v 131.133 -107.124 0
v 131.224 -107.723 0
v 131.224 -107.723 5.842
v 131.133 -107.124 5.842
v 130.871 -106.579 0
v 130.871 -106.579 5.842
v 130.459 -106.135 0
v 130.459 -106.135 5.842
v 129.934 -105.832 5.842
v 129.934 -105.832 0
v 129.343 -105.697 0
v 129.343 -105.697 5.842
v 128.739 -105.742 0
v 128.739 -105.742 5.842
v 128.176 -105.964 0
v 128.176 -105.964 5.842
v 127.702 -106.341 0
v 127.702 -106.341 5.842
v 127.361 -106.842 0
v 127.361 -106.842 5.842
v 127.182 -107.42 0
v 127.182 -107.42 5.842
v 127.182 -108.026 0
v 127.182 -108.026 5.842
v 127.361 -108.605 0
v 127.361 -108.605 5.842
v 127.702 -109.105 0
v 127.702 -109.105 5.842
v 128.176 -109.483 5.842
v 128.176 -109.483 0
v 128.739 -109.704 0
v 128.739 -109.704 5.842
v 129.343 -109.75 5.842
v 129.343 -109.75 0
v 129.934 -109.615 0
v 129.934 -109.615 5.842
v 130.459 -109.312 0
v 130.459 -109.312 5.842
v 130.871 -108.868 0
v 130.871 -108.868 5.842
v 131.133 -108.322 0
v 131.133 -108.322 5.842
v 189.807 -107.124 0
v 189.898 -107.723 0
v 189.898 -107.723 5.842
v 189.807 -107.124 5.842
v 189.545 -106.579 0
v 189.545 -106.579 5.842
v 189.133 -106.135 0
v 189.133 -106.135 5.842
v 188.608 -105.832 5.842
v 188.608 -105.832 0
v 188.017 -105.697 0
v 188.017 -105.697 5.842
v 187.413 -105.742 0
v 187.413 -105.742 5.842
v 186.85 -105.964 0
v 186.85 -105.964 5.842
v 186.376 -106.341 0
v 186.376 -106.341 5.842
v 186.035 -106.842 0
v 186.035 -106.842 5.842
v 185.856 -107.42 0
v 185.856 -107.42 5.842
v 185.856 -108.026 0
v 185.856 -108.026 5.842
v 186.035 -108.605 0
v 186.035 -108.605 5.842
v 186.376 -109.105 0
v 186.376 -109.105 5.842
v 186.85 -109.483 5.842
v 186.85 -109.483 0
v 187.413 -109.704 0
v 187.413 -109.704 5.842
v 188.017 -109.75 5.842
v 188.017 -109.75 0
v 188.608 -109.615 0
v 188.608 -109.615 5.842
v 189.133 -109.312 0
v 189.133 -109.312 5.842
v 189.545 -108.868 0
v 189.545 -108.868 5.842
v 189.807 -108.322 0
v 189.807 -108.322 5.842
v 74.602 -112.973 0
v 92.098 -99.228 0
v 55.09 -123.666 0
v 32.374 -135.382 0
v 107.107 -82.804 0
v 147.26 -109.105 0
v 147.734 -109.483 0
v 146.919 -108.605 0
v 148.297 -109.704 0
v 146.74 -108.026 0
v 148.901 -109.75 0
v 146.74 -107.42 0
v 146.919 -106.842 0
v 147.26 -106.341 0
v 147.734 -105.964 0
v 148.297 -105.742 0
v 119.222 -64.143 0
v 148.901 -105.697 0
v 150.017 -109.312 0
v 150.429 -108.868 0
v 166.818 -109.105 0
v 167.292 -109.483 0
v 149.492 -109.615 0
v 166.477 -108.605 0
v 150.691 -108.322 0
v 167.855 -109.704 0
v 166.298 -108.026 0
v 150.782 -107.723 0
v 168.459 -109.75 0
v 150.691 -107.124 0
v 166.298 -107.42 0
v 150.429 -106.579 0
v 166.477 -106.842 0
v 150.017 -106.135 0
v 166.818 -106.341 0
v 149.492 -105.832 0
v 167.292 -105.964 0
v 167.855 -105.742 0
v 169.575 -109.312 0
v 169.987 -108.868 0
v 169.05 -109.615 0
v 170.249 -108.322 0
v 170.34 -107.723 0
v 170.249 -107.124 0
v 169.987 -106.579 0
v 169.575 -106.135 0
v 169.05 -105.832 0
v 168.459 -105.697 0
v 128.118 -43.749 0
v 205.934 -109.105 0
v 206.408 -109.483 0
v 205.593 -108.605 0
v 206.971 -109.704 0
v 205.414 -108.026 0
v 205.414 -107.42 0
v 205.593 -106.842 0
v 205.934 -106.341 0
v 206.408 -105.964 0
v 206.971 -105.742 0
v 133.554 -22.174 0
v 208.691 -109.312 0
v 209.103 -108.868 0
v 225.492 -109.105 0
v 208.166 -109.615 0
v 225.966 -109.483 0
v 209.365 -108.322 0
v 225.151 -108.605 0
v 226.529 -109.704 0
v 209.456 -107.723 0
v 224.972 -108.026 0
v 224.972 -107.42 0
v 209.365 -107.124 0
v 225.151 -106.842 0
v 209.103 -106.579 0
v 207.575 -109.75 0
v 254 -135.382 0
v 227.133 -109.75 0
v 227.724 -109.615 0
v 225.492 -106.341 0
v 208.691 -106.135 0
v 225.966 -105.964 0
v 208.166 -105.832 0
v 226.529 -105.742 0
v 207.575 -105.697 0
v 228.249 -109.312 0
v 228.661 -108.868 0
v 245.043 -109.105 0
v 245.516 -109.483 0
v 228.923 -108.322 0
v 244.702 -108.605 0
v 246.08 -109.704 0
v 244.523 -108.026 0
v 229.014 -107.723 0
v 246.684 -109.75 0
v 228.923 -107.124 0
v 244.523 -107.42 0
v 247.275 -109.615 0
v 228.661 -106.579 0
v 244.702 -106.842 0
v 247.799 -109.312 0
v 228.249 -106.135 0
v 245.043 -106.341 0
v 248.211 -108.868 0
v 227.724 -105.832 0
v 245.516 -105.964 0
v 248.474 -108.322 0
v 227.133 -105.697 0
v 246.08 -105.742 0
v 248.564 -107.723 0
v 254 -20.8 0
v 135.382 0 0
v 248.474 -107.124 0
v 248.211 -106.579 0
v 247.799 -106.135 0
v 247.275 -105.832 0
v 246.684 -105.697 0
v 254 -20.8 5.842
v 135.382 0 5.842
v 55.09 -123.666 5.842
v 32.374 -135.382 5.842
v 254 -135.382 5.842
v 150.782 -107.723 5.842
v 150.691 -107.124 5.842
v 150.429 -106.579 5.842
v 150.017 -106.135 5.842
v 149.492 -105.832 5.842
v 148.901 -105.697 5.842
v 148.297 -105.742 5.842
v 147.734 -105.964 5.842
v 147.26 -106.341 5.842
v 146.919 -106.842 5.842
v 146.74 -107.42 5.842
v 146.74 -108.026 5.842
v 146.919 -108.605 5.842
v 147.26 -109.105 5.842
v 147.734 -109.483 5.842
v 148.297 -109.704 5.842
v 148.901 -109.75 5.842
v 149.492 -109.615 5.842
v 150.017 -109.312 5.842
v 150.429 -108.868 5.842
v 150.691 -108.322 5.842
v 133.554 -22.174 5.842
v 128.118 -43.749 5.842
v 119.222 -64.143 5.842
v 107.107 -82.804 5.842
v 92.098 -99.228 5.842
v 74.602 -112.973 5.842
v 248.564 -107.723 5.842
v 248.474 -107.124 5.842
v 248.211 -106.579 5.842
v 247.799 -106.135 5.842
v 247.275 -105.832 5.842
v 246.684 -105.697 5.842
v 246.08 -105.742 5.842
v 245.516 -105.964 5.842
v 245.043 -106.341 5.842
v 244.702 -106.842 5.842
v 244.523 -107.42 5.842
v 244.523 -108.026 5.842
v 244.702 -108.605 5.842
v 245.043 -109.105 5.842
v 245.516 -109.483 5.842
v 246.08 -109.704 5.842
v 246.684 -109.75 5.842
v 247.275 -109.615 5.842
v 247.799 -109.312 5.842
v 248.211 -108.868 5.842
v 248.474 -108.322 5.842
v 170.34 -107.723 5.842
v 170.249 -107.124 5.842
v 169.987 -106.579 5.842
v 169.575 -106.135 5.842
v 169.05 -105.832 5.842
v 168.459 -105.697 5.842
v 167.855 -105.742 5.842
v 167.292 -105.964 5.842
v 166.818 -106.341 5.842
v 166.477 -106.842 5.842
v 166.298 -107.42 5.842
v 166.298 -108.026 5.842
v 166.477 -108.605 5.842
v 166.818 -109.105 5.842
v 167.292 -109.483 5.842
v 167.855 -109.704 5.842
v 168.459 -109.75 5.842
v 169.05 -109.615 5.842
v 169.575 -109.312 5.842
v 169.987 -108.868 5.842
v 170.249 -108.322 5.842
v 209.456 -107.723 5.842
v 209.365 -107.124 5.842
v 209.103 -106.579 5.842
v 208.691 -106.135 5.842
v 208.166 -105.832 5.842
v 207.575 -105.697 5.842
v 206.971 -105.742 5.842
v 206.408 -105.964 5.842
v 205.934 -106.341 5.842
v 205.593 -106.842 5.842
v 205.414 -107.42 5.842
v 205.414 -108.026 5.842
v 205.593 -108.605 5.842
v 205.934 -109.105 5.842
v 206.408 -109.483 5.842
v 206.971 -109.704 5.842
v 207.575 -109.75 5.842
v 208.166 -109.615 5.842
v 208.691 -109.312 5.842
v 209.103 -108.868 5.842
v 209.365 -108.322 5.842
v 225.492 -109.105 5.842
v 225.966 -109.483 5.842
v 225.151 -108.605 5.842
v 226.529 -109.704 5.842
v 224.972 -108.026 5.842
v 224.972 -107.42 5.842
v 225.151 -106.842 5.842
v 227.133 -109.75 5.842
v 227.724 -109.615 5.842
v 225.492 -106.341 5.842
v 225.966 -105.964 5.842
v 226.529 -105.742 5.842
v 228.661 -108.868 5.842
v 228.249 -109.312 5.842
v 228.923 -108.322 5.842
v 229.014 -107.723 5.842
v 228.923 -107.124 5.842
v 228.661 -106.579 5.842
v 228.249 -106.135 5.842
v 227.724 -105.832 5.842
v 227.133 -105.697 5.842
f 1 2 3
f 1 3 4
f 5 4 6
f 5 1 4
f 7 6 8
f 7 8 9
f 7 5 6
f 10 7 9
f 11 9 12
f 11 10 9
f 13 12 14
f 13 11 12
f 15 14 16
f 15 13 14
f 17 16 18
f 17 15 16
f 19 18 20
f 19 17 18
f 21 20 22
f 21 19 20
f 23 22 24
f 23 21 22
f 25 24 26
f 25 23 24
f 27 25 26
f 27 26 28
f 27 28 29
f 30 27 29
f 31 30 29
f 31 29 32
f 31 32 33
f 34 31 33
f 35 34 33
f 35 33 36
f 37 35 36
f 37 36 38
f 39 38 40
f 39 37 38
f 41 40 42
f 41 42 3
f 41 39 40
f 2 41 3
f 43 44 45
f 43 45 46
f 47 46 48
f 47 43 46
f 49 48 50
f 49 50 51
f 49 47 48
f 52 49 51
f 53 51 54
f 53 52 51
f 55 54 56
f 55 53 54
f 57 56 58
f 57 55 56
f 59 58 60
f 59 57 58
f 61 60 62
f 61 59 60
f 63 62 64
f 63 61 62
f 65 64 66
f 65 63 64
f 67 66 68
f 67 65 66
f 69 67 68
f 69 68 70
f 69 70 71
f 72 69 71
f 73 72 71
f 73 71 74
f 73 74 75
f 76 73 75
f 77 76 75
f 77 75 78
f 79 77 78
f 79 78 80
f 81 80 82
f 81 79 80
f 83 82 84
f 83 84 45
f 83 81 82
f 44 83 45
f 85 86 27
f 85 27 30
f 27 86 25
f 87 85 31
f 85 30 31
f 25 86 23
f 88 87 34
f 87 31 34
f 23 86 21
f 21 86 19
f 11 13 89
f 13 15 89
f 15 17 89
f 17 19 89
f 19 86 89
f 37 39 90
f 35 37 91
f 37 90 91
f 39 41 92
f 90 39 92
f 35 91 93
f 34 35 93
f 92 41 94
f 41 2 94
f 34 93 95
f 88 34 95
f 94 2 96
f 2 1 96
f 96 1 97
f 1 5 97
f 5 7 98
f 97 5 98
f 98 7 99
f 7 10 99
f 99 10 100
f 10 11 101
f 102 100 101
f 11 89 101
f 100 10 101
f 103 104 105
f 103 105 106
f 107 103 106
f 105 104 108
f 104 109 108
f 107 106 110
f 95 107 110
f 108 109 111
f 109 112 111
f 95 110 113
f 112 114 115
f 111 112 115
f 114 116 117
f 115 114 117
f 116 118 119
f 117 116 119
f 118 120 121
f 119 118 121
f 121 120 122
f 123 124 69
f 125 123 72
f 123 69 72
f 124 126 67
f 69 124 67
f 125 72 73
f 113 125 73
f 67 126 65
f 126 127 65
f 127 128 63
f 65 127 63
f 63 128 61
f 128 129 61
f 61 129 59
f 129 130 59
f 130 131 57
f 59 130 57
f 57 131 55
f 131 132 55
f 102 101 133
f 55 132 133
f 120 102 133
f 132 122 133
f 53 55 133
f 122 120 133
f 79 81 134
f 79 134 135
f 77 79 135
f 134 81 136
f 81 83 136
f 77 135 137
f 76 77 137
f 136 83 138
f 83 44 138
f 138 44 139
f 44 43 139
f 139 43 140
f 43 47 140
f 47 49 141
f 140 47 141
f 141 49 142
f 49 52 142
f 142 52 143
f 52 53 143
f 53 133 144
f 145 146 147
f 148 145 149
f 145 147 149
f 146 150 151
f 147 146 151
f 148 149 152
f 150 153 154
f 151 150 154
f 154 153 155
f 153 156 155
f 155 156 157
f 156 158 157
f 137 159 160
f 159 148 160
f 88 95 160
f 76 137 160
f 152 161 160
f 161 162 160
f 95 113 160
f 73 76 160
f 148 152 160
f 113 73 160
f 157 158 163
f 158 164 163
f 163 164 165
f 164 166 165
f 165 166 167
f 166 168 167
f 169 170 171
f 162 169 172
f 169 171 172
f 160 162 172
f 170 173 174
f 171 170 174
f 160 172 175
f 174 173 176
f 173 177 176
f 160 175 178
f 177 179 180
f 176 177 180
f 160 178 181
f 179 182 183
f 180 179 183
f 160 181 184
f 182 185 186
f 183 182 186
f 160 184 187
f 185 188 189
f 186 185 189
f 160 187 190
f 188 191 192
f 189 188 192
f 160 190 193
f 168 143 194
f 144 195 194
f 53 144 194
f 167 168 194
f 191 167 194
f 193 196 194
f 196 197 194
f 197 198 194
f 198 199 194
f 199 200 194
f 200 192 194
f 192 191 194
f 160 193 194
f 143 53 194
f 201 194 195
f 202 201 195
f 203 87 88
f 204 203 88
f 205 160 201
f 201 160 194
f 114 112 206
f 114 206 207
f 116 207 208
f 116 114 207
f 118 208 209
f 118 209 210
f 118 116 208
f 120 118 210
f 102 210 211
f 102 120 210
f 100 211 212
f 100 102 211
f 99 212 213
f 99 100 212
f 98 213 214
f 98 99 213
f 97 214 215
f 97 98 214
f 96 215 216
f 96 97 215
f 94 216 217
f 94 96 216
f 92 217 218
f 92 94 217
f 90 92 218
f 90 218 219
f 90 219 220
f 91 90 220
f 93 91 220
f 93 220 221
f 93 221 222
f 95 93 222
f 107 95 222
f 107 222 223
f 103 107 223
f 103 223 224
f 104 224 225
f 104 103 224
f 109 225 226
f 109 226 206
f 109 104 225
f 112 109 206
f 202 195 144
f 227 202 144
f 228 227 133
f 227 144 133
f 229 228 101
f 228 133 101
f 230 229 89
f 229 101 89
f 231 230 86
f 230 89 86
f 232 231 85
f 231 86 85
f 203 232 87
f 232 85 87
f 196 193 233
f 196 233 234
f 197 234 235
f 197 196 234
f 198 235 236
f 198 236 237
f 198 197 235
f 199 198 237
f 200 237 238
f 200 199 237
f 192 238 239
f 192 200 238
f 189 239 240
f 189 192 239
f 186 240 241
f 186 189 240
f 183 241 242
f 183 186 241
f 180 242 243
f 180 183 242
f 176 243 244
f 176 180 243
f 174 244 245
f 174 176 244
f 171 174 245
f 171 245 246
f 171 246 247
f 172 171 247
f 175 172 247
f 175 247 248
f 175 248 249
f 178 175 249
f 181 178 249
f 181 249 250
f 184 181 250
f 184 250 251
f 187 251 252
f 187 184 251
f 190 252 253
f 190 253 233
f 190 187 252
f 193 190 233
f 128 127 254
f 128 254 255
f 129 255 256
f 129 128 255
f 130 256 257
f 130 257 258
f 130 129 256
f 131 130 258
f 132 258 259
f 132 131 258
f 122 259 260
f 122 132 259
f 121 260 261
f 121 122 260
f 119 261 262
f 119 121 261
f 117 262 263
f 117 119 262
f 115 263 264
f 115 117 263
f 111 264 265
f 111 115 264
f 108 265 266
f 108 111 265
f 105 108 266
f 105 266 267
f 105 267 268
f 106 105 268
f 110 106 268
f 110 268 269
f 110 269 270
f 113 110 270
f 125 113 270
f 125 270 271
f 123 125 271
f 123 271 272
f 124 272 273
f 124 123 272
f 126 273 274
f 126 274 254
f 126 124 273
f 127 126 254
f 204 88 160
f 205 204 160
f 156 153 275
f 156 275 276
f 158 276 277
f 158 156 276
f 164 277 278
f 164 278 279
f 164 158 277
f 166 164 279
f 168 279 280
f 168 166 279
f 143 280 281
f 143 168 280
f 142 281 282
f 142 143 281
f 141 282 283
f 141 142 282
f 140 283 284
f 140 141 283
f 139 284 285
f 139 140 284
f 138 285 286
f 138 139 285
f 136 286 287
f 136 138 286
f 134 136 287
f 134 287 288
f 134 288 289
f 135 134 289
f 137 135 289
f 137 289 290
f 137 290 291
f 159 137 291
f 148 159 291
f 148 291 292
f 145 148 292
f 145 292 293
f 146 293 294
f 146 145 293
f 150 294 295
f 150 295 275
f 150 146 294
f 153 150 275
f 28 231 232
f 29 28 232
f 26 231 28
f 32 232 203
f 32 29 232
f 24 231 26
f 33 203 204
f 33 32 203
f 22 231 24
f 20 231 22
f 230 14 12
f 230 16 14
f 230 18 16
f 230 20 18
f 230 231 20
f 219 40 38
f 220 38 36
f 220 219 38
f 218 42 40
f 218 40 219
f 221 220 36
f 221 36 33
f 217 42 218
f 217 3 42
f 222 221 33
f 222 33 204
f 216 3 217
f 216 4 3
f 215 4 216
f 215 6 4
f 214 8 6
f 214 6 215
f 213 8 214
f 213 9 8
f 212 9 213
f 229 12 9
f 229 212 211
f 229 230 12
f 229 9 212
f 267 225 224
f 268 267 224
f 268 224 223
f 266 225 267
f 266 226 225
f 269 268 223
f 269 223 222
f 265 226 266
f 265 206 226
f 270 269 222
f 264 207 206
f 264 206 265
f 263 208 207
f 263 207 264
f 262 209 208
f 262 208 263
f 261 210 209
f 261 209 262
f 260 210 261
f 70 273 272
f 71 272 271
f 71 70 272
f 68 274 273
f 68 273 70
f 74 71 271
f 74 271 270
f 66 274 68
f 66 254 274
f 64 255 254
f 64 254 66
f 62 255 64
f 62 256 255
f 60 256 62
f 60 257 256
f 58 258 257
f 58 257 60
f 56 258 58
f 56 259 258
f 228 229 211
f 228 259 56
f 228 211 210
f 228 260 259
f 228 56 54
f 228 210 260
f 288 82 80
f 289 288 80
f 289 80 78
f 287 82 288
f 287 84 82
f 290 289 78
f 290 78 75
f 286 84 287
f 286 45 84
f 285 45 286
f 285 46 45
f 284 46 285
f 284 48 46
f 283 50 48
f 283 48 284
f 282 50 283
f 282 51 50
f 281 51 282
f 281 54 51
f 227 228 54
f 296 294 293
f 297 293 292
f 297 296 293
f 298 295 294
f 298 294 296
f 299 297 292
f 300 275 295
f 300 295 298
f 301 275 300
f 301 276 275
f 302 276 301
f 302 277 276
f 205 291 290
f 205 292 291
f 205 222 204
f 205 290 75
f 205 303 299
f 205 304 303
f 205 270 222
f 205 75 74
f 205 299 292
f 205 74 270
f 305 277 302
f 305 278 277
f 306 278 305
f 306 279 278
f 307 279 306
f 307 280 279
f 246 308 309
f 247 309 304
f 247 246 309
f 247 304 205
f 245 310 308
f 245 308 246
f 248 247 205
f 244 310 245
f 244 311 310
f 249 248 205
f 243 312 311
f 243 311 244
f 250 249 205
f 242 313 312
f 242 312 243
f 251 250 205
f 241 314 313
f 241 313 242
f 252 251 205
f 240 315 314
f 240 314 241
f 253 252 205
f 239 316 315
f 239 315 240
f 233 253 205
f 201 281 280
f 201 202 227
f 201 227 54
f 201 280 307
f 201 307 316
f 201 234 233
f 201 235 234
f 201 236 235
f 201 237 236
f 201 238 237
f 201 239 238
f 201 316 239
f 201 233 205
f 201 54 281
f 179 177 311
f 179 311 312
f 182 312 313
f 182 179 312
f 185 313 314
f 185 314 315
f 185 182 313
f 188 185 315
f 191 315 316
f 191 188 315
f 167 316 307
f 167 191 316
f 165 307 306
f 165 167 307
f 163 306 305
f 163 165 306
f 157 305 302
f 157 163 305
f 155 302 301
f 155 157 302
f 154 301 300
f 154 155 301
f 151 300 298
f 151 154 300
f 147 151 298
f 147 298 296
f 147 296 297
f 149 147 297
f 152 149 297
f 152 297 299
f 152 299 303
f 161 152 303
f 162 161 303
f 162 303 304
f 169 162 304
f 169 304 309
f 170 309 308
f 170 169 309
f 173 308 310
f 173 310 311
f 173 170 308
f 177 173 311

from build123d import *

# Parameters (mm, degrees)
F1_R     = 2.032
F2_DEPTH = 5.842


with BuildPart() as f2:
    # F1 (on face) → F2 (new body)
    with BuildSketch(Plane.XY):
        with BuildLine():
            Line((254, -20.800026), (135.382, 0))
            ThreePointArc((135.382, 0), (113.548513, -73.722595), (55.090365, -123.666235))
            Line((55.090365, -123.666235), (32.373808, -135.382))
            Line((32.373808, -135.382), (253.931671, -135.382))
            Line((253.931671, -135.382), (254, -135.382))
            Line((254, -135.382), (254, -20.800026))
        make_face()
        with Locations((129.191592, -107.723273)):
            Circle(F1_R, mode=Mode.SUBTRACT)
        with Locations((148.749592, -107.723273)):
            Circle(F1_R, mode=Mode.SUBTRACT)
        with Locations((168.307592, -107.723273)):
            Circle(F1_R, mode=Mode.SUBTRACT)
        with Locations((187.865592, -107.723273)):
            Circle(F1_R, mode=Mode.SUBTRACT)
        with Locations((207.423592, -107.723273)):
            Circle(F1_R, mode=Mode.SUBTRACT)
        with Locations((226.981592, -107.723273)):
            Circle(F1_R, mode=Mode.SUBTRACT)
        with Locations((246.532425, -107.723273)):
            Circle(F1_R, mode=Mode.SUBTRACT)
    extrude(amount=F2_DEPTH)


solid = f2.part
